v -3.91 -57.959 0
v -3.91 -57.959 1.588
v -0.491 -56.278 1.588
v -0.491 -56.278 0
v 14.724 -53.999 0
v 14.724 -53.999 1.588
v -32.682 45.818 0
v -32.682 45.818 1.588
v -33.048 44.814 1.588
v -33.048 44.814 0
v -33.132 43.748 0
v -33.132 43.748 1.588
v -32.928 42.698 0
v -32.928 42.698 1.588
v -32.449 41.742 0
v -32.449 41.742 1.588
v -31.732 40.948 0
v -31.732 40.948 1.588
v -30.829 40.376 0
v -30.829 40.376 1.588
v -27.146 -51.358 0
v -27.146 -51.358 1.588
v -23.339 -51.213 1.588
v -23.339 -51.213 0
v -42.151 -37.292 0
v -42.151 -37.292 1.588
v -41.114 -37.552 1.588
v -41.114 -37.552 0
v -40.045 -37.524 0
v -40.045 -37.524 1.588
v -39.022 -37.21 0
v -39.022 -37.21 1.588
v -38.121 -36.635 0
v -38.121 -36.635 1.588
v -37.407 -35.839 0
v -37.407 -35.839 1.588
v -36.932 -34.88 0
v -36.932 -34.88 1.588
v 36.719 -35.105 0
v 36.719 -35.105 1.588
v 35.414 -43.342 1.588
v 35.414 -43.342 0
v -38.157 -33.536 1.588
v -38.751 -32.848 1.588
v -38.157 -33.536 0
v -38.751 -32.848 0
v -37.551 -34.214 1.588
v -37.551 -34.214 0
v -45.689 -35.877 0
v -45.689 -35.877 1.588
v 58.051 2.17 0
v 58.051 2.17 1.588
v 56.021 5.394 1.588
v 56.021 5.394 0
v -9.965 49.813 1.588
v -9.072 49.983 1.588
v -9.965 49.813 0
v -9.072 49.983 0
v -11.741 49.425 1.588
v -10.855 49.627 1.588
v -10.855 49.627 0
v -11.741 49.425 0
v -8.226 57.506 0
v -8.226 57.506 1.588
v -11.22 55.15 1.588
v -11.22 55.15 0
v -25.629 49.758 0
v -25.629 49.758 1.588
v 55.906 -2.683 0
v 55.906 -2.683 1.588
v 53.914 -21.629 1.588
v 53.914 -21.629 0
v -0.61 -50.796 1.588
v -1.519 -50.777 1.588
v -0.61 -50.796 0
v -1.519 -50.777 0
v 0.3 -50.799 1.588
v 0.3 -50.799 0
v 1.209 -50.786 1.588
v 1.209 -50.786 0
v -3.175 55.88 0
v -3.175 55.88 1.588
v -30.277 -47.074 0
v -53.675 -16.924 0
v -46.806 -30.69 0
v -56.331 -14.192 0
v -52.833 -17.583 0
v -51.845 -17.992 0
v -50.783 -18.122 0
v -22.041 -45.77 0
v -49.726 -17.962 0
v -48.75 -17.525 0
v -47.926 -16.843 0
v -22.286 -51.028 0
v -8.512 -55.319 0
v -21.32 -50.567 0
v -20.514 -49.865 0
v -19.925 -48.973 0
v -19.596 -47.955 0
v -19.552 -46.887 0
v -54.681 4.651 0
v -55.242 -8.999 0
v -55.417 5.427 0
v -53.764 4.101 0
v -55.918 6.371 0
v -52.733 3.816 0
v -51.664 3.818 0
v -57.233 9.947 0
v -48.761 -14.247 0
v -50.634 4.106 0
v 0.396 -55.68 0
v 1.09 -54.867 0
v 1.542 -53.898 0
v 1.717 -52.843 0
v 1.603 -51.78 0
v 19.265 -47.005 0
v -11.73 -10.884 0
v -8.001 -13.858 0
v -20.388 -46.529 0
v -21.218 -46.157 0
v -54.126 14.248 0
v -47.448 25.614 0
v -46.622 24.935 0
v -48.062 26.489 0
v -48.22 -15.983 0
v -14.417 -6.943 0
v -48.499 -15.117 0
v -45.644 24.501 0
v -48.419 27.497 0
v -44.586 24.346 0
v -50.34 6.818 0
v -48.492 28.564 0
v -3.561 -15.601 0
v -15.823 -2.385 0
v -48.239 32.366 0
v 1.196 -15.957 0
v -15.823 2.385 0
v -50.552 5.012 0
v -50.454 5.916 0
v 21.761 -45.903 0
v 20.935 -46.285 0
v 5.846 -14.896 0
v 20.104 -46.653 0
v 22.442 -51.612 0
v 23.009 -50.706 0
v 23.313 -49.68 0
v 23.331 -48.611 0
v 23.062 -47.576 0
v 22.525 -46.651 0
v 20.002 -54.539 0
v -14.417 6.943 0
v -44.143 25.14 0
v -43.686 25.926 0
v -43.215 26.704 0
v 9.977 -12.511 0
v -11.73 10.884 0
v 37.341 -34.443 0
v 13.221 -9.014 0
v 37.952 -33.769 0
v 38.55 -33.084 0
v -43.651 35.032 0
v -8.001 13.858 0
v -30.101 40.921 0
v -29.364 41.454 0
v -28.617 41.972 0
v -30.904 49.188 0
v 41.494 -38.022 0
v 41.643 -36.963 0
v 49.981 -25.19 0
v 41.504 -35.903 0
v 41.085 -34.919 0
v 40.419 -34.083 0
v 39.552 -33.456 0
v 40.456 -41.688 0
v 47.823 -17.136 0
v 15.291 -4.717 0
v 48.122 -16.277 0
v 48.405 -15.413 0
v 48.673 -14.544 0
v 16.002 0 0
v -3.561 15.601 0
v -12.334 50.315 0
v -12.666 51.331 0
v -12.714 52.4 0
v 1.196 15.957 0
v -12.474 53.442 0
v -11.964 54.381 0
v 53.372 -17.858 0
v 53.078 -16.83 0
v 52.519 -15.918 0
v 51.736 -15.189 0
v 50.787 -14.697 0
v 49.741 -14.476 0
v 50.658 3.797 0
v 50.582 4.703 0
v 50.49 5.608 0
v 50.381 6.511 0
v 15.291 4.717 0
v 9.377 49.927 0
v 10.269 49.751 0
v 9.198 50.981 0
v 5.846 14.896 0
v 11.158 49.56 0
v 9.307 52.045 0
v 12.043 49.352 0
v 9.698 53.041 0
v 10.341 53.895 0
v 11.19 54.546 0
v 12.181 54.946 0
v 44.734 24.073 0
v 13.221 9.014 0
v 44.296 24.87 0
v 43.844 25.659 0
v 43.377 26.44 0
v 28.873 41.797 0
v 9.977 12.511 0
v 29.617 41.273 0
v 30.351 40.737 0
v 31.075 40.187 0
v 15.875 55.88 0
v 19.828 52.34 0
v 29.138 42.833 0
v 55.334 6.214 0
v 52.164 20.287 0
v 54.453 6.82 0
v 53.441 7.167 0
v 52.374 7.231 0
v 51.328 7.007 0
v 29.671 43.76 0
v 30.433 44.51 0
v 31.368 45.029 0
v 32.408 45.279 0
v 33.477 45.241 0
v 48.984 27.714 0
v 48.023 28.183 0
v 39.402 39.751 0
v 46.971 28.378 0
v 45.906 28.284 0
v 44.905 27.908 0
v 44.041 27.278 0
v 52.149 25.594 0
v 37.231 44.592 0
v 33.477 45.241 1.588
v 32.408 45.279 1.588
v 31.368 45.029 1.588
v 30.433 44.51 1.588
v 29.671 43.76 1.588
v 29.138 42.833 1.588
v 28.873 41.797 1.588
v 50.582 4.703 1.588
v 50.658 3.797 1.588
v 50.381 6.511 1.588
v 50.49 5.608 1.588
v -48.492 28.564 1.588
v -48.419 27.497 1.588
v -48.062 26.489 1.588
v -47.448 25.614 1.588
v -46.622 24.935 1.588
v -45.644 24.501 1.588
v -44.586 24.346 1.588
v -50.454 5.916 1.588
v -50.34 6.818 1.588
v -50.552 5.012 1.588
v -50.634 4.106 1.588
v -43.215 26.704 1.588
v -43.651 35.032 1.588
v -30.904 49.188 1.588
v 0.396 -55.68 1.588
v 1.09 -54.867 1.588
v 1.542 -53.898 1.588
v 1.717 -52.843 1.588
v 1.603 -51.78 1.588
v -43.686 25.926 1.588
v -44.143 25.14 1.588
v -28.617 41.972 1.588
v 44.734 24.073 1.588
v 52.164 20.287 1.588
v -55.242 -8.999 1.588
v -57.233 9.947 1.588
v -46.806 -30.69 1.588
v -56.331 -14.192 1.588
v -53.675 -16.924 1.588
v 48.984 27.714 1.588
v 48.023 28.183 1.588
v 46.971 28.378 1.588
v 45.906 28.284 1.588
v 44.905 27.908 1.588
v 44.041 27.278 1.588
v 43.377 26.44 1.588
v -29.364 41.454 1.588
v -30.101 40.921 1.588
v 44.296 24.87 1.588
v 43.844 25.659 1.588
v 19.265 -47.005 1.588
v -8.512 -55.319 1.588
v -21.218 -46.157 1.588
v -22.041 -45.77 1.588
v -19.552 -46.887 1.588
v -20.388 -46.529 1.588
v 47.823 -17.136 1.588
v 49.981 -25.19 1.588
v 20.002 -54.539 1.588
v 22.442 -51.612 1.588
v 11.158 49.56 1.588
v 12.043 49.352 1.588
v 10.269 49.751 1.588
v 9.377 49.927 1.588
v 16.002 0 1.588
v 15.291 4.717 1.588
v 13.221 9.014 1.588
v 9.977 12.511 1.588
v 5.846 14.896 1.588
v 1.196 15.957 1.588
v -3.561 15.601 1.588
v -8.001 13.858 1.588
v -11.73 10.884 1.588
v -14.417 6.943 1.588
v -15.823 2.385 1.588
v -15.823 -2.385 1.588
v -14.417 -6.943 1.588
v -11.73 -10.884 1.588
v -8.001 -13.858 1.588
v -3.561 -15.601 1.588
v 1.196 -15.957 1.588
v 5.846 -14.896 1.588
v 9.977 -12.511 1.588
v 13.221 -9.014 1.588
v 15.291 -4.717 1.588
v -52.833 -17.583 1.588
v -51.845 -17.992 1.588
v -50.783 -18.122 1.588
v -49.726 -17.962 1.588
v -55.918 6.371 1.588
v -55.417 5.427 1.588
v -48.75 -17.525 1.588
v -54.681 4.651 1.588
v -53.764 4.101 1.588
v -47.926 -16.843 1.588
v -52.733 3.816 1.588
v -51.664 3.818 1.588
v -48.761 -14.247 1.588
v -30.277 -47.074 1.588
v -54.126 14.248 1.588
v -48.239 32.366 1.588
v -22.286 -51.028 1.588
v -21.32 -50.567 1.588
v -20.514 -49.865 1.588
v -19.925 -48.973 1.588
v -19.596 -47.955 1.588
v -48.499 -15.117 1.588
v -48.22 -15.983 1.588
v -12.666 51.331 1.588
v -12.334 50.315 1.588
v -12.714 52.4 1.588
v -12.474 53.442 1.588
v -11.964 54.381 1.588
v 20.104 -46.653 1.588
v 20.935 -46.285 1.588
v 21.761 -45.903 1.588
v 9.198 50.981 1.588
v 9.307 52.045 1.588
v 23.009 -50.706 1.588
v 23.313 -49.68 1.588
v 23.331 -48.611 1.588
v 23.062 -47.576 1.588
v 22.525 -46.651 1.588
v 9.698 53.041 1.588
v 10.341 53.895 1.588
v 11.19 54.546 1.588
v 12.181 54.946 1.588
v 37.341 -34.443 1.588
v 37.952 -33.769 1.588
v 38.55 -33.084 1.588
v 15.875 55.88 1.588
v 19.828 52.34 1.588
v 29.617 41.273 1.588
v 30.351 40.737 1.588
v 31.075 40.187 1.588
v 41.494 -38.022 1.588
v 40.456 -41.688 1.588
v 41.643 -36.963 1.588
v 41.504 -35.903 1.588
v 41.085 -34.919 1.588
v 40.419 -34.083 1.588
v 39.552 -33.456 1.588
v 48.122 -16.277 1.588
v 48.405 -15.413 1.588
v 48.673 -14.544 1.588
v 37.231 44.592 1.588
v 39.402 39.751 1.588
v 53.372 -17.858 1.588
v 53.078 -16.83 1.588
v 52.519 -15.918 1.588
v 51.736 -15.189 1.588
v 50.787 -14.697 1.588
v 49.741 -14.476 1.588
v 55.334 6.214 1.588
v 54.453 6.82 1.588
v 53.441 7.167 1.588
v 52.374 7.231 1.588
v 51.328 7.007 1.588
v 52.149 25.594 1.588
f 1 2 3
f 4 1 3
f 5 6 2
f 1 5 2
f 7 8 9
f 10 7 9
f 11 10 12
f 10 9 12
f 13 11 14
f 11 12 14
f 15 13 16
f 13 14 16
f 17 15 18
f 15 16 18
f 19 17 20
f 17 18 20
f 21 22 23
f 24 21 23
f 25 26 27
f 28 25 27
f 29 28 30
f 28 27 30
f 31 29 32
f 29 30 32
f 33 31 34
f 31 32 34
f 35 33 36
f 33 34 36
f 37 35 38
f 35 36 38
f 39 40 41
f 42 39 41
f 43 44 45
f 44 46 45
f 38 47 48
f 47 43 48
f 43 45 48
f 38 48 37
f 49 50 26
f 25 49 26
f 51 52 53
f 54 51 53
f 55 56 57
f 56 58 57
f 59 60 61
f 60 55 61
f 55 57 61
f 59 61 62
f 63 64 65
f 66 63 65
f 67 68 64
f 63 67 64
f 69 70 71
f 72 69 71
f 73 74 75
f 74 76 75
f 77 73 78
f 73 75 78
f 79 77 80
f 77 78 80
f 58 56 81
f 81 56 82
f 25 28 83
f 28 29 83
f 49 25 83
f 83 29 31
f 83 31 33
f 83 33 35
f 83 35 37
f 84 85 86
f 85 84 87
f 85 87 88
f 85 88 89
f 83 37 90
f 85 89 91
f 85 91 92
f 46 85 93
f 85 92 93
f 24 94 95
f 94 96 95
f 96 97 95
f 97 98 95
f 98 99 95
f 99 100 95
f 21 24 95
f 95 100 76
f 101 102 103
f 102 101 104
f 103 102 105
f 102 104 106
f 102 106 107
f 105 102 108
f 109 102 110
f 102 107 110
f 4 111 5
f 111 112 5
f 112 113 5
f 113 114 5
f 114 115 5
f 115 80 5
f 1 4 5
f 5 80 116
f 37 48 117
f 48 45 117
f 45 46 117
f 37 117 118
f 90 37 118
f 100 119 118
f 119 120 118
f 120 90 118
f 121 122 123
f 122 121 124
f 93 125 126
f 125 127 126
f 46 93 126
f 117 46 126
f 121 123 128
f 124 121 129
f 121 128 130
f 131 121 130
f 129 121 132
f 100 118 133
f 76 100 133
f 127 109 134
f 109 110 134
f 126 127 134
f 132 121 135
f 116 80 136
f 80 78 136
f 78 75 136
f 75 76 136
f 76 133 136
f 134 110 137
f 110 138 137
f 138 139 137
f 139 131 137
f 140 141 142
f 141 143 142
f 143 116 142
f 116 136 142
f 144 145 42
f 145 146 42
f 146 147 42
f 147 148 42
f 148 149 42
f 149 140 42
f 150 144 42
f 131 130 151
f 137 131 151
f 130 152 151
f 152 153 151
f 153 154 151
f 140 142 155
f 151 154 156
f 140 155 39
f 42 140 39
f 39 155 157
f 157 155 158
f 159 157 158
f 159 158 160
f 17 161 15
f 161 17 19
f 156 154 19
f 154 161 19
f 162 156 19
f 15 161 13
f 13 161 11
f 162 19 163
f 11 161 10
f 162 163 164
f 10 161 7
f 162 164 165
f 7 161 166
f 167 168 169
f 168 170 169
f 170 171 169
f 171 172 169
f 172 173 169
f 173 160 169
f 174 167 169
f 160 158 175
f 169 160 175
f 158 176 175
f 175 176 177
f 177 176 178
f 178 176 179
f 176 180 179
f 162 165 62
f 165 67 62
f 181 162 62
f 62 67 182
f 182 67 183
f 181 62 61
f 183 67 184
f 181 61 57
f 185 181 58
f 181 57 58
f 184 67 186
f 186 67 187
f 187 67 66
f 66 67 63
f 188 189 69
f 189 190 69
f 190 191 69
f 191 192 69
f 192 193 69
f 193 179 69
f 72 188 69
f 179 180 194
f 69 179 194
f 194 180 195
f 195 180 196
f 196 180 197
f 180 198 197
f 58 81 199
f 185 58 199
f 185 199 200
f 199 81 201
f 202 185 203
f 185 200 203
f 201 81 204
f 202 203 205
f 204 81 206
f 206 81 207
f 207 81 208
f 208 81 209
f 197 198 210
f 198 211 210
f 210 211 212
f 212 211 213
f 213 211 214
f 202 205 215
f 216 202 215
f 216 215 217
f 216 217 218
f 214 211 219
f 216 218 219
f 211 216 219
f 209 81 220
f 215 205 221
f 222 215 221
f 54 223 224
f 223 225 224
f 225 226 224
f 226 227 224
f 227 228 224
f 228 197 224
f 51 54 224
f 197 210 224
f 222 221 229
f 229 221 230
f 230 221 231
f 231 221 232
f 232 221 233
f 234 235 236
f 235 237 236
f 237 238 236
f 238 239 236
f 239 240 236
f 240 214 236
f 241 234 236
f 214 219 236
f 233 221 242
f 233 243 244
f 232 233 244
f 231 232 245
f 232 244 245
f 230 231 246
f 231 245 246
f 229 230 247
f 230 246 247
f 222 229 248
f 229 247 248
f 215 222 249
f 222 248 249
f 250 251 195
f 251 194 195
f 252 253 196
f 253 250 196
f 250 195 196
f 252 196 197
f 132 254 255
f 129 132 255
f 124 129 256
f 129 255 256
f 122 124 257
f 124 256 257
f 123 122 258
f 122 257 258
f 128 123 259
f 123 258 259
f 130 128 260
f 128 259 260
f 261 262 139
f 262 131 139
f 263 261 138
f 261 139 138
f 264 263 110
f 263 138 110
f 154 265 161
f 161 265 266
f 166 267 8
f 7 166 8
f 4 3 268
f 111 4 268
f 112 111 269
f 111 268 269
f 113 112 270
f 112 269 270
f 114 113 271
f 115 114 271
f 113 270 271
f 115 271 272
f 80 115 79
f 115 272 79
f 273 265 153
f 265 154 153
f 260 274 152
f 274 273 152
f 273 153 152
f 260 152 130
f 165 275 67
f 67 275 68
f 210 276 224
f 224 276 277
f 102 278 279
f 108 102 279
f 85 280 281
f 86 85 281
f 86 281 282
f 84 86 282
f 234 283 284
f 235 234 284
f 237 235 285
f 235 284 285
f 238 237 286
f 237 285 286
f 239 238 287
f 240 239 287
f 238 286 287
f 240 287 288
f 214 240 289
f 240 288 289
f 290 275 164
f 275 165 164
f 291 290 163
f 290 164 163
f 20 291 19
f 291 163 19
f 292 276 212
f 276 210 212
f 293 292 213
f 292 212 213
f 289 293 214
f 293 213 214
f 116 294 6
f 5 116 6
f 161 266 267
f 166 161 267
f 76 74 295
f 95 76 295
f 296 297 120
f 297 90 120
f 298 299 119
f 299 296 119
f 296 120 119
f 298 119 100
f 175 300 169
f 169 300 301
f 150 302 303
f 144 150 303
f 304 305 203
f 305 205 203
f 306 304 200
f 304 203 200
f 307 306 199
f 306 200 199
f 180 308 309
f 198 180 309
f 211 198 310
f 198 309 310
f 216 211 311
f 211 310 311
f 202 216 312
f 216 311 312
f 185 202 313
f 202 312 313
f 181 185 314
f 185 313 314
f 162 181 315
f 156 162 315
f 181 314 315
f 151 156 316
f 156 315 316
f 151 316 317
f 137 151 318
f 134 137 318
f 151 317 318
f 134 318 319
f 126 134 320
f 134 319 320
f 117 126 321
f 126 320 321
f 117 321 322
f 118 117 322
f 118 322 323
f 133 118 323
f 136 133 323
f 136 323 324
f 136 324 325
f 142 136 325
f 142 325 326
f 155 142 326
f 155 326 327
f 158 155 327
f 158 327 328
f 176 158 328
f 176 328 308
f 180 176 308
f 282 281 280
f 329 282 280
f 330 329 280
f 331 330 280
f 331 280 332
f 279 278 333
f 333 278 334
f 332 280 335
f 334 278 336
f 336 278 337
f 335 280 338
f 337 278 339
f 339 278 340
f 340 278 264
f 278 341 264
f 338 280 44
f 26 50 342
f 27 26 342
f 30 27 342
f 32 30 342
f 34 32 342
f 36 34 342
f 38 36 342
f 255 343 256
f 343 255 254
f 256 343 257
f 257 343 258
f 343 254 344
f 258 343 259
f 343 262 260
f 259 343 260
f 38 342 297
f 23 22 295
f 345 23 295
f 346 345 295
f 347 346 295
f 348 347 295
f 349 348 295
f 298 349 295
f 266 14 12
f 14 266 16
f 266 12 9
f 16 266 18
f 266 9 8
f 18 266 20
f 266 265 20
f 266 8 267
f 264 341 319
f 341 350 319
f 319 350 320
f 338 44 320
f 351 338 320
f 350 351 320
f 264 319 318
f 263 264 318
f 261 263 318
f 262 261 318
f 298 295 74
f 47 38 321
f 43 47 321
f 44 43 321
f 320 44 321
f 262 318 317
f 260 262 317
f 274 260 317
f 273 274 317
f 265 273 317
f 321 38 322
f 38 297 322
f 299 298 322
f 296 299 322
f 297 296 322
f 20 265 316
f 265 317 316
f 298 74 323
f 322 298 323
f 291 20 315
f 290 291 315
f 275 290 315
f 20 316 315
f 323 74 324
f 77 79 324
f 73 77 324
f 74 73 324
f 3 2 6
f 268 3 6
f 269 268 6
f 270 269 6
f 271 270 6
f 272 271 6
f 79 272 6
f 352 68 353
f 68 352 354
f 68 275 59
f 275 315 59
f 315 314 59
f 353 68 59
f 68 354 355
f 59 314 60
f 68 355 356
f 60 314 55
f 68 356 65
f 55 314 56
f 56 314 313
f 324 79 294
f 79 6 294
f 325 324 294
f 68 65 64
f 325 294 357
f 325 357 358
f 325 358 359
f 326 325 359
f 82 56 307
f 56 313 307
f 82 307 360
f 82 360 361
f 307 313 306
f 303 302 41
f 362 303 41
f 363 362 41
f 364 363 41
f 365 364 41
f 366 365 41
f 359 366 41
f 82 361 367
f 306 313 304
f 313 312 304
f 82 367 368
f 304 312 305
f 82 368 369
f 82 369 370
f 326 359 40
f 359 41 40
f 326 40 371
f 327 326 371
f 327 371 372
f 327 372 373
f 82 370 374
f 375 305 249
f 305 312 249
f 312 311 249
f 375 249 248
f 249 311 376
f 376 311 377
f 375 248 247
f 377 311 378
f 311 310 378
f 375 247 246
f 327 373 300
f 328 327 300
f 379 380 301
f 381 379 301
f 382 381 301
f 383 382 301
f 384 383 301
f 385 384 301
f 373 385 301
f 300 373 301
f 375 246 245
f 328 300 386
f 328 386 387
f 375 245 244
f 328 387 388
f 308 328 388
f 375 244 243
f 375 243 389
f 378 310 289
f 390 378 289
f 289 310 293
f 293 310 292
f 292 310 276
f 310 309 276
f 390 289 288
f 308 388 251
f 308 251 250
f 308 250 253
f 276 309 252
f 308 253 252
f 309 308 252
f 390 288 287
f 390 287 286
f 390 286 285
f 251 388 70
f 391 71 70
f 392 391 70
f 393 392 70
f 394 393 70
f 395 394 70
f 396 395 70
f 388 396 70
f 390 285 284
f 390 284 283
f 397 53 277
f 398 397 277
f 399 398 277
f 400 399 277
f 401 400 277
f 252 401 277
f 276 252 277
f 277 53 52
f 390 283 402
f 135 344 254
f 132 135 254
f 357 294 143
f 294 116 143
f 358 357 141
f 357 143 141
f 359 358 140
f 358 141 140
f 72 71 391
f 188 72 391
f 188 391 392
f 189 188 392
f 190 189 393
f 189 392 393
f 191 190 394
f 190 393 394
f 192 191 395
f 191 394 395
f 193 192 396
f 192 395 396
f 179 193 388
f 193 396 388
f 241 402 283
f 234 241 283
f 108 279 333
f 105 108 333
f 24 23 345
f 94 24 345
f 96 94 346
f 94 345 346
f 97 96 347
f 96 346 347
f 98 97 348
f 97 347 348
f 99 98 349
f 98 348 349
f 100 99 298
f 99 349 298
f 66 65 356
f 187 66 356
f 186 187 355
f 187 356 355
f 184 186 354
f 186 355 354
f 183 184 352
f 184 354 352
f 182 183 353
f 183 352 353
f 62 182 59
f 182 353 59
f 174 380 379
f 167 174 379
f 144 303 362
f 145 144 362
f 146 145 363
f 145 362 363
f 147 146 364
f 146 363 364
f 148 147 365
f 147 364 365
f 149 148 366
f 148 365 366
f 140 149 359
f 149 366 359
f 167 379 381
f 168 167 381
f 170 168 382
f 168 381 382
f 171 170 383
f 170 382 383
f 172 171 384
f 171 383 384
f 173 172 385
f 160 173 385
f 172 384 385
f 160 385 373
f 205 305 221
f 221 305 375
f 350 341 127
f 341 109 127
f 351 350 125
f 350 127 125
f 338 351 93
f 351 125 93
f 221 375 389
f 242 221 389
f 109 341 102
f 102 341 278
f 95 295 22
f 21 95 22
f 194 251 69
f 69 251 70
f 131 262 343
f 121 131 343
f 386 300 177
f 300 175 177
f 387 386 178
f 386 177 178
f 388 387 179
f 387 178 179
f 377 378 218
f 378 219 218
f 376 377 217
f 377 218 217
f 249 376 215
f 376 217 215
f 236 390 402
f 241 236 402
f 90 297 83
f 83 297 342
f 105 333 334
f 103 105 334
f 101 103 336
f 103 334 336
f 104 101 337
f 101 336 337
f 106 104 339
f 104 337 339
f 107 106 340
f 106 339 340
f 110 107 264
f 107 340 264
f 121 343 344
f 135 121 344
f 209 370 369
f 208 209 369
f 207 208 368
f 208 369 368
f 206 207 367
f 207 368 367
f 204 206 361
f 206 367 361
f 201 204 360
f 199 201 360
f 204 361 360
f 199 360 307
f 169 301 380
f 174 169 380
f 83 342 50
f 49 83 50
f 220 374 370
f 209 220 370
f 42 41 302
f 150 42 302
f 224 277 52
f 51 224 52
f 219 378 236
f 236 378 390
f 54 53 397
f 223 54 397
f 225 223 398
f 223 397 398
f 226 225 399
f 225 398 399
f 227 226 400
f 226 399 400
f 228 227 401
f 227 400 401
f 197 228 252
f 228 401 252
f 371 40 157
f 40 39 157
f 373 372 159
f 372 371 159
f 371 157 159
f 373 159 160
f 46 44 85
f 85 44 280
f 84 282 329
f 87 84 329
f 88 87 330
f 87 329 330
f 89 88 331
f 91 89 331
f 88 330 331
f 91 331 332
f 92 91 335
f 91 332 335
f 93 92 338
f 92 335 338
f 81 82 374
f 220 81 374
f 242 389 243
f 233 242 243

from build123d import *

# Parameters (mm, degrees)
SKETCH1_R           = 50.8
BOSS_EXTRUDE1_DEPTH = 1.5875
CUT_EXTRUDE1_REACH  = 73.86
SKETCH2_R           = 16.002
BOSS_EXTRUDE2_DEPTH = 1.5875
CIRPATTERN1_COUNT   = 15


with BuildPart() as part:
    # Sketch1 → Boss-Extrude1 (new body)
    with BuildSketch(Plane.XY):
        Circle(SKETCH1_R)
    extrude(amount=BOSS_EXTRUDE1_DEPTH)

    # Sketch2 → Cut-Extrude1 (cut, up to next)
    with BuildSketch(Plane.XY.offset(1.5875), mode=Mode.PRIVATE) as cut_extrude1_sk1:
        Circle(SKETCH2_R)
    cut_extrude1_tool1 = extrude(cut_extrude1_sk1.sketch, amount=-CUT_EXTRUDE1_REACH, mode=Mode.PRIVATE) & part.part
    add(cut_extrude1_tool1.solids().sort_by_distance((0, 0, 1.5875))[0], mode=Mode.SUBTRACT)

    # Sketch4 → Boss-Extrude2 (add)
    with BuildSketch(Plane.XY.offset(1.5875)):
        with BuildLine():
            Line((-9.525, 49.53), (-3.175, 55.88))
            Line((-3.175, 55.88), (15.875, 55.88))
            Line((15.875, 55.88), (12.1812879, 54.945874246))
            ThreePointArc((12.1812879, 54.945874246), (9.599565558, 52.852771398), (9.525, 49.53))
            Line((9.525, 49.53), (-9.525, 49.53))
        make_face()
    boss_extrude2 = extrude(amount=-BOSS_EXTRUDE2_DEPTH)

    # CirPattern1: Boss-Extrude2 ×15 about axis
    cirpattern1_axis = Axis((0, 0, 0), (0, 0, 1))
    for i in range(1, CIRPATTERN1_COUNT):
        add(boss_extrude2.rotate(cirpattern1_axis, i * 360 / CIRPATTERN1_COUNT))


solid = part.part
